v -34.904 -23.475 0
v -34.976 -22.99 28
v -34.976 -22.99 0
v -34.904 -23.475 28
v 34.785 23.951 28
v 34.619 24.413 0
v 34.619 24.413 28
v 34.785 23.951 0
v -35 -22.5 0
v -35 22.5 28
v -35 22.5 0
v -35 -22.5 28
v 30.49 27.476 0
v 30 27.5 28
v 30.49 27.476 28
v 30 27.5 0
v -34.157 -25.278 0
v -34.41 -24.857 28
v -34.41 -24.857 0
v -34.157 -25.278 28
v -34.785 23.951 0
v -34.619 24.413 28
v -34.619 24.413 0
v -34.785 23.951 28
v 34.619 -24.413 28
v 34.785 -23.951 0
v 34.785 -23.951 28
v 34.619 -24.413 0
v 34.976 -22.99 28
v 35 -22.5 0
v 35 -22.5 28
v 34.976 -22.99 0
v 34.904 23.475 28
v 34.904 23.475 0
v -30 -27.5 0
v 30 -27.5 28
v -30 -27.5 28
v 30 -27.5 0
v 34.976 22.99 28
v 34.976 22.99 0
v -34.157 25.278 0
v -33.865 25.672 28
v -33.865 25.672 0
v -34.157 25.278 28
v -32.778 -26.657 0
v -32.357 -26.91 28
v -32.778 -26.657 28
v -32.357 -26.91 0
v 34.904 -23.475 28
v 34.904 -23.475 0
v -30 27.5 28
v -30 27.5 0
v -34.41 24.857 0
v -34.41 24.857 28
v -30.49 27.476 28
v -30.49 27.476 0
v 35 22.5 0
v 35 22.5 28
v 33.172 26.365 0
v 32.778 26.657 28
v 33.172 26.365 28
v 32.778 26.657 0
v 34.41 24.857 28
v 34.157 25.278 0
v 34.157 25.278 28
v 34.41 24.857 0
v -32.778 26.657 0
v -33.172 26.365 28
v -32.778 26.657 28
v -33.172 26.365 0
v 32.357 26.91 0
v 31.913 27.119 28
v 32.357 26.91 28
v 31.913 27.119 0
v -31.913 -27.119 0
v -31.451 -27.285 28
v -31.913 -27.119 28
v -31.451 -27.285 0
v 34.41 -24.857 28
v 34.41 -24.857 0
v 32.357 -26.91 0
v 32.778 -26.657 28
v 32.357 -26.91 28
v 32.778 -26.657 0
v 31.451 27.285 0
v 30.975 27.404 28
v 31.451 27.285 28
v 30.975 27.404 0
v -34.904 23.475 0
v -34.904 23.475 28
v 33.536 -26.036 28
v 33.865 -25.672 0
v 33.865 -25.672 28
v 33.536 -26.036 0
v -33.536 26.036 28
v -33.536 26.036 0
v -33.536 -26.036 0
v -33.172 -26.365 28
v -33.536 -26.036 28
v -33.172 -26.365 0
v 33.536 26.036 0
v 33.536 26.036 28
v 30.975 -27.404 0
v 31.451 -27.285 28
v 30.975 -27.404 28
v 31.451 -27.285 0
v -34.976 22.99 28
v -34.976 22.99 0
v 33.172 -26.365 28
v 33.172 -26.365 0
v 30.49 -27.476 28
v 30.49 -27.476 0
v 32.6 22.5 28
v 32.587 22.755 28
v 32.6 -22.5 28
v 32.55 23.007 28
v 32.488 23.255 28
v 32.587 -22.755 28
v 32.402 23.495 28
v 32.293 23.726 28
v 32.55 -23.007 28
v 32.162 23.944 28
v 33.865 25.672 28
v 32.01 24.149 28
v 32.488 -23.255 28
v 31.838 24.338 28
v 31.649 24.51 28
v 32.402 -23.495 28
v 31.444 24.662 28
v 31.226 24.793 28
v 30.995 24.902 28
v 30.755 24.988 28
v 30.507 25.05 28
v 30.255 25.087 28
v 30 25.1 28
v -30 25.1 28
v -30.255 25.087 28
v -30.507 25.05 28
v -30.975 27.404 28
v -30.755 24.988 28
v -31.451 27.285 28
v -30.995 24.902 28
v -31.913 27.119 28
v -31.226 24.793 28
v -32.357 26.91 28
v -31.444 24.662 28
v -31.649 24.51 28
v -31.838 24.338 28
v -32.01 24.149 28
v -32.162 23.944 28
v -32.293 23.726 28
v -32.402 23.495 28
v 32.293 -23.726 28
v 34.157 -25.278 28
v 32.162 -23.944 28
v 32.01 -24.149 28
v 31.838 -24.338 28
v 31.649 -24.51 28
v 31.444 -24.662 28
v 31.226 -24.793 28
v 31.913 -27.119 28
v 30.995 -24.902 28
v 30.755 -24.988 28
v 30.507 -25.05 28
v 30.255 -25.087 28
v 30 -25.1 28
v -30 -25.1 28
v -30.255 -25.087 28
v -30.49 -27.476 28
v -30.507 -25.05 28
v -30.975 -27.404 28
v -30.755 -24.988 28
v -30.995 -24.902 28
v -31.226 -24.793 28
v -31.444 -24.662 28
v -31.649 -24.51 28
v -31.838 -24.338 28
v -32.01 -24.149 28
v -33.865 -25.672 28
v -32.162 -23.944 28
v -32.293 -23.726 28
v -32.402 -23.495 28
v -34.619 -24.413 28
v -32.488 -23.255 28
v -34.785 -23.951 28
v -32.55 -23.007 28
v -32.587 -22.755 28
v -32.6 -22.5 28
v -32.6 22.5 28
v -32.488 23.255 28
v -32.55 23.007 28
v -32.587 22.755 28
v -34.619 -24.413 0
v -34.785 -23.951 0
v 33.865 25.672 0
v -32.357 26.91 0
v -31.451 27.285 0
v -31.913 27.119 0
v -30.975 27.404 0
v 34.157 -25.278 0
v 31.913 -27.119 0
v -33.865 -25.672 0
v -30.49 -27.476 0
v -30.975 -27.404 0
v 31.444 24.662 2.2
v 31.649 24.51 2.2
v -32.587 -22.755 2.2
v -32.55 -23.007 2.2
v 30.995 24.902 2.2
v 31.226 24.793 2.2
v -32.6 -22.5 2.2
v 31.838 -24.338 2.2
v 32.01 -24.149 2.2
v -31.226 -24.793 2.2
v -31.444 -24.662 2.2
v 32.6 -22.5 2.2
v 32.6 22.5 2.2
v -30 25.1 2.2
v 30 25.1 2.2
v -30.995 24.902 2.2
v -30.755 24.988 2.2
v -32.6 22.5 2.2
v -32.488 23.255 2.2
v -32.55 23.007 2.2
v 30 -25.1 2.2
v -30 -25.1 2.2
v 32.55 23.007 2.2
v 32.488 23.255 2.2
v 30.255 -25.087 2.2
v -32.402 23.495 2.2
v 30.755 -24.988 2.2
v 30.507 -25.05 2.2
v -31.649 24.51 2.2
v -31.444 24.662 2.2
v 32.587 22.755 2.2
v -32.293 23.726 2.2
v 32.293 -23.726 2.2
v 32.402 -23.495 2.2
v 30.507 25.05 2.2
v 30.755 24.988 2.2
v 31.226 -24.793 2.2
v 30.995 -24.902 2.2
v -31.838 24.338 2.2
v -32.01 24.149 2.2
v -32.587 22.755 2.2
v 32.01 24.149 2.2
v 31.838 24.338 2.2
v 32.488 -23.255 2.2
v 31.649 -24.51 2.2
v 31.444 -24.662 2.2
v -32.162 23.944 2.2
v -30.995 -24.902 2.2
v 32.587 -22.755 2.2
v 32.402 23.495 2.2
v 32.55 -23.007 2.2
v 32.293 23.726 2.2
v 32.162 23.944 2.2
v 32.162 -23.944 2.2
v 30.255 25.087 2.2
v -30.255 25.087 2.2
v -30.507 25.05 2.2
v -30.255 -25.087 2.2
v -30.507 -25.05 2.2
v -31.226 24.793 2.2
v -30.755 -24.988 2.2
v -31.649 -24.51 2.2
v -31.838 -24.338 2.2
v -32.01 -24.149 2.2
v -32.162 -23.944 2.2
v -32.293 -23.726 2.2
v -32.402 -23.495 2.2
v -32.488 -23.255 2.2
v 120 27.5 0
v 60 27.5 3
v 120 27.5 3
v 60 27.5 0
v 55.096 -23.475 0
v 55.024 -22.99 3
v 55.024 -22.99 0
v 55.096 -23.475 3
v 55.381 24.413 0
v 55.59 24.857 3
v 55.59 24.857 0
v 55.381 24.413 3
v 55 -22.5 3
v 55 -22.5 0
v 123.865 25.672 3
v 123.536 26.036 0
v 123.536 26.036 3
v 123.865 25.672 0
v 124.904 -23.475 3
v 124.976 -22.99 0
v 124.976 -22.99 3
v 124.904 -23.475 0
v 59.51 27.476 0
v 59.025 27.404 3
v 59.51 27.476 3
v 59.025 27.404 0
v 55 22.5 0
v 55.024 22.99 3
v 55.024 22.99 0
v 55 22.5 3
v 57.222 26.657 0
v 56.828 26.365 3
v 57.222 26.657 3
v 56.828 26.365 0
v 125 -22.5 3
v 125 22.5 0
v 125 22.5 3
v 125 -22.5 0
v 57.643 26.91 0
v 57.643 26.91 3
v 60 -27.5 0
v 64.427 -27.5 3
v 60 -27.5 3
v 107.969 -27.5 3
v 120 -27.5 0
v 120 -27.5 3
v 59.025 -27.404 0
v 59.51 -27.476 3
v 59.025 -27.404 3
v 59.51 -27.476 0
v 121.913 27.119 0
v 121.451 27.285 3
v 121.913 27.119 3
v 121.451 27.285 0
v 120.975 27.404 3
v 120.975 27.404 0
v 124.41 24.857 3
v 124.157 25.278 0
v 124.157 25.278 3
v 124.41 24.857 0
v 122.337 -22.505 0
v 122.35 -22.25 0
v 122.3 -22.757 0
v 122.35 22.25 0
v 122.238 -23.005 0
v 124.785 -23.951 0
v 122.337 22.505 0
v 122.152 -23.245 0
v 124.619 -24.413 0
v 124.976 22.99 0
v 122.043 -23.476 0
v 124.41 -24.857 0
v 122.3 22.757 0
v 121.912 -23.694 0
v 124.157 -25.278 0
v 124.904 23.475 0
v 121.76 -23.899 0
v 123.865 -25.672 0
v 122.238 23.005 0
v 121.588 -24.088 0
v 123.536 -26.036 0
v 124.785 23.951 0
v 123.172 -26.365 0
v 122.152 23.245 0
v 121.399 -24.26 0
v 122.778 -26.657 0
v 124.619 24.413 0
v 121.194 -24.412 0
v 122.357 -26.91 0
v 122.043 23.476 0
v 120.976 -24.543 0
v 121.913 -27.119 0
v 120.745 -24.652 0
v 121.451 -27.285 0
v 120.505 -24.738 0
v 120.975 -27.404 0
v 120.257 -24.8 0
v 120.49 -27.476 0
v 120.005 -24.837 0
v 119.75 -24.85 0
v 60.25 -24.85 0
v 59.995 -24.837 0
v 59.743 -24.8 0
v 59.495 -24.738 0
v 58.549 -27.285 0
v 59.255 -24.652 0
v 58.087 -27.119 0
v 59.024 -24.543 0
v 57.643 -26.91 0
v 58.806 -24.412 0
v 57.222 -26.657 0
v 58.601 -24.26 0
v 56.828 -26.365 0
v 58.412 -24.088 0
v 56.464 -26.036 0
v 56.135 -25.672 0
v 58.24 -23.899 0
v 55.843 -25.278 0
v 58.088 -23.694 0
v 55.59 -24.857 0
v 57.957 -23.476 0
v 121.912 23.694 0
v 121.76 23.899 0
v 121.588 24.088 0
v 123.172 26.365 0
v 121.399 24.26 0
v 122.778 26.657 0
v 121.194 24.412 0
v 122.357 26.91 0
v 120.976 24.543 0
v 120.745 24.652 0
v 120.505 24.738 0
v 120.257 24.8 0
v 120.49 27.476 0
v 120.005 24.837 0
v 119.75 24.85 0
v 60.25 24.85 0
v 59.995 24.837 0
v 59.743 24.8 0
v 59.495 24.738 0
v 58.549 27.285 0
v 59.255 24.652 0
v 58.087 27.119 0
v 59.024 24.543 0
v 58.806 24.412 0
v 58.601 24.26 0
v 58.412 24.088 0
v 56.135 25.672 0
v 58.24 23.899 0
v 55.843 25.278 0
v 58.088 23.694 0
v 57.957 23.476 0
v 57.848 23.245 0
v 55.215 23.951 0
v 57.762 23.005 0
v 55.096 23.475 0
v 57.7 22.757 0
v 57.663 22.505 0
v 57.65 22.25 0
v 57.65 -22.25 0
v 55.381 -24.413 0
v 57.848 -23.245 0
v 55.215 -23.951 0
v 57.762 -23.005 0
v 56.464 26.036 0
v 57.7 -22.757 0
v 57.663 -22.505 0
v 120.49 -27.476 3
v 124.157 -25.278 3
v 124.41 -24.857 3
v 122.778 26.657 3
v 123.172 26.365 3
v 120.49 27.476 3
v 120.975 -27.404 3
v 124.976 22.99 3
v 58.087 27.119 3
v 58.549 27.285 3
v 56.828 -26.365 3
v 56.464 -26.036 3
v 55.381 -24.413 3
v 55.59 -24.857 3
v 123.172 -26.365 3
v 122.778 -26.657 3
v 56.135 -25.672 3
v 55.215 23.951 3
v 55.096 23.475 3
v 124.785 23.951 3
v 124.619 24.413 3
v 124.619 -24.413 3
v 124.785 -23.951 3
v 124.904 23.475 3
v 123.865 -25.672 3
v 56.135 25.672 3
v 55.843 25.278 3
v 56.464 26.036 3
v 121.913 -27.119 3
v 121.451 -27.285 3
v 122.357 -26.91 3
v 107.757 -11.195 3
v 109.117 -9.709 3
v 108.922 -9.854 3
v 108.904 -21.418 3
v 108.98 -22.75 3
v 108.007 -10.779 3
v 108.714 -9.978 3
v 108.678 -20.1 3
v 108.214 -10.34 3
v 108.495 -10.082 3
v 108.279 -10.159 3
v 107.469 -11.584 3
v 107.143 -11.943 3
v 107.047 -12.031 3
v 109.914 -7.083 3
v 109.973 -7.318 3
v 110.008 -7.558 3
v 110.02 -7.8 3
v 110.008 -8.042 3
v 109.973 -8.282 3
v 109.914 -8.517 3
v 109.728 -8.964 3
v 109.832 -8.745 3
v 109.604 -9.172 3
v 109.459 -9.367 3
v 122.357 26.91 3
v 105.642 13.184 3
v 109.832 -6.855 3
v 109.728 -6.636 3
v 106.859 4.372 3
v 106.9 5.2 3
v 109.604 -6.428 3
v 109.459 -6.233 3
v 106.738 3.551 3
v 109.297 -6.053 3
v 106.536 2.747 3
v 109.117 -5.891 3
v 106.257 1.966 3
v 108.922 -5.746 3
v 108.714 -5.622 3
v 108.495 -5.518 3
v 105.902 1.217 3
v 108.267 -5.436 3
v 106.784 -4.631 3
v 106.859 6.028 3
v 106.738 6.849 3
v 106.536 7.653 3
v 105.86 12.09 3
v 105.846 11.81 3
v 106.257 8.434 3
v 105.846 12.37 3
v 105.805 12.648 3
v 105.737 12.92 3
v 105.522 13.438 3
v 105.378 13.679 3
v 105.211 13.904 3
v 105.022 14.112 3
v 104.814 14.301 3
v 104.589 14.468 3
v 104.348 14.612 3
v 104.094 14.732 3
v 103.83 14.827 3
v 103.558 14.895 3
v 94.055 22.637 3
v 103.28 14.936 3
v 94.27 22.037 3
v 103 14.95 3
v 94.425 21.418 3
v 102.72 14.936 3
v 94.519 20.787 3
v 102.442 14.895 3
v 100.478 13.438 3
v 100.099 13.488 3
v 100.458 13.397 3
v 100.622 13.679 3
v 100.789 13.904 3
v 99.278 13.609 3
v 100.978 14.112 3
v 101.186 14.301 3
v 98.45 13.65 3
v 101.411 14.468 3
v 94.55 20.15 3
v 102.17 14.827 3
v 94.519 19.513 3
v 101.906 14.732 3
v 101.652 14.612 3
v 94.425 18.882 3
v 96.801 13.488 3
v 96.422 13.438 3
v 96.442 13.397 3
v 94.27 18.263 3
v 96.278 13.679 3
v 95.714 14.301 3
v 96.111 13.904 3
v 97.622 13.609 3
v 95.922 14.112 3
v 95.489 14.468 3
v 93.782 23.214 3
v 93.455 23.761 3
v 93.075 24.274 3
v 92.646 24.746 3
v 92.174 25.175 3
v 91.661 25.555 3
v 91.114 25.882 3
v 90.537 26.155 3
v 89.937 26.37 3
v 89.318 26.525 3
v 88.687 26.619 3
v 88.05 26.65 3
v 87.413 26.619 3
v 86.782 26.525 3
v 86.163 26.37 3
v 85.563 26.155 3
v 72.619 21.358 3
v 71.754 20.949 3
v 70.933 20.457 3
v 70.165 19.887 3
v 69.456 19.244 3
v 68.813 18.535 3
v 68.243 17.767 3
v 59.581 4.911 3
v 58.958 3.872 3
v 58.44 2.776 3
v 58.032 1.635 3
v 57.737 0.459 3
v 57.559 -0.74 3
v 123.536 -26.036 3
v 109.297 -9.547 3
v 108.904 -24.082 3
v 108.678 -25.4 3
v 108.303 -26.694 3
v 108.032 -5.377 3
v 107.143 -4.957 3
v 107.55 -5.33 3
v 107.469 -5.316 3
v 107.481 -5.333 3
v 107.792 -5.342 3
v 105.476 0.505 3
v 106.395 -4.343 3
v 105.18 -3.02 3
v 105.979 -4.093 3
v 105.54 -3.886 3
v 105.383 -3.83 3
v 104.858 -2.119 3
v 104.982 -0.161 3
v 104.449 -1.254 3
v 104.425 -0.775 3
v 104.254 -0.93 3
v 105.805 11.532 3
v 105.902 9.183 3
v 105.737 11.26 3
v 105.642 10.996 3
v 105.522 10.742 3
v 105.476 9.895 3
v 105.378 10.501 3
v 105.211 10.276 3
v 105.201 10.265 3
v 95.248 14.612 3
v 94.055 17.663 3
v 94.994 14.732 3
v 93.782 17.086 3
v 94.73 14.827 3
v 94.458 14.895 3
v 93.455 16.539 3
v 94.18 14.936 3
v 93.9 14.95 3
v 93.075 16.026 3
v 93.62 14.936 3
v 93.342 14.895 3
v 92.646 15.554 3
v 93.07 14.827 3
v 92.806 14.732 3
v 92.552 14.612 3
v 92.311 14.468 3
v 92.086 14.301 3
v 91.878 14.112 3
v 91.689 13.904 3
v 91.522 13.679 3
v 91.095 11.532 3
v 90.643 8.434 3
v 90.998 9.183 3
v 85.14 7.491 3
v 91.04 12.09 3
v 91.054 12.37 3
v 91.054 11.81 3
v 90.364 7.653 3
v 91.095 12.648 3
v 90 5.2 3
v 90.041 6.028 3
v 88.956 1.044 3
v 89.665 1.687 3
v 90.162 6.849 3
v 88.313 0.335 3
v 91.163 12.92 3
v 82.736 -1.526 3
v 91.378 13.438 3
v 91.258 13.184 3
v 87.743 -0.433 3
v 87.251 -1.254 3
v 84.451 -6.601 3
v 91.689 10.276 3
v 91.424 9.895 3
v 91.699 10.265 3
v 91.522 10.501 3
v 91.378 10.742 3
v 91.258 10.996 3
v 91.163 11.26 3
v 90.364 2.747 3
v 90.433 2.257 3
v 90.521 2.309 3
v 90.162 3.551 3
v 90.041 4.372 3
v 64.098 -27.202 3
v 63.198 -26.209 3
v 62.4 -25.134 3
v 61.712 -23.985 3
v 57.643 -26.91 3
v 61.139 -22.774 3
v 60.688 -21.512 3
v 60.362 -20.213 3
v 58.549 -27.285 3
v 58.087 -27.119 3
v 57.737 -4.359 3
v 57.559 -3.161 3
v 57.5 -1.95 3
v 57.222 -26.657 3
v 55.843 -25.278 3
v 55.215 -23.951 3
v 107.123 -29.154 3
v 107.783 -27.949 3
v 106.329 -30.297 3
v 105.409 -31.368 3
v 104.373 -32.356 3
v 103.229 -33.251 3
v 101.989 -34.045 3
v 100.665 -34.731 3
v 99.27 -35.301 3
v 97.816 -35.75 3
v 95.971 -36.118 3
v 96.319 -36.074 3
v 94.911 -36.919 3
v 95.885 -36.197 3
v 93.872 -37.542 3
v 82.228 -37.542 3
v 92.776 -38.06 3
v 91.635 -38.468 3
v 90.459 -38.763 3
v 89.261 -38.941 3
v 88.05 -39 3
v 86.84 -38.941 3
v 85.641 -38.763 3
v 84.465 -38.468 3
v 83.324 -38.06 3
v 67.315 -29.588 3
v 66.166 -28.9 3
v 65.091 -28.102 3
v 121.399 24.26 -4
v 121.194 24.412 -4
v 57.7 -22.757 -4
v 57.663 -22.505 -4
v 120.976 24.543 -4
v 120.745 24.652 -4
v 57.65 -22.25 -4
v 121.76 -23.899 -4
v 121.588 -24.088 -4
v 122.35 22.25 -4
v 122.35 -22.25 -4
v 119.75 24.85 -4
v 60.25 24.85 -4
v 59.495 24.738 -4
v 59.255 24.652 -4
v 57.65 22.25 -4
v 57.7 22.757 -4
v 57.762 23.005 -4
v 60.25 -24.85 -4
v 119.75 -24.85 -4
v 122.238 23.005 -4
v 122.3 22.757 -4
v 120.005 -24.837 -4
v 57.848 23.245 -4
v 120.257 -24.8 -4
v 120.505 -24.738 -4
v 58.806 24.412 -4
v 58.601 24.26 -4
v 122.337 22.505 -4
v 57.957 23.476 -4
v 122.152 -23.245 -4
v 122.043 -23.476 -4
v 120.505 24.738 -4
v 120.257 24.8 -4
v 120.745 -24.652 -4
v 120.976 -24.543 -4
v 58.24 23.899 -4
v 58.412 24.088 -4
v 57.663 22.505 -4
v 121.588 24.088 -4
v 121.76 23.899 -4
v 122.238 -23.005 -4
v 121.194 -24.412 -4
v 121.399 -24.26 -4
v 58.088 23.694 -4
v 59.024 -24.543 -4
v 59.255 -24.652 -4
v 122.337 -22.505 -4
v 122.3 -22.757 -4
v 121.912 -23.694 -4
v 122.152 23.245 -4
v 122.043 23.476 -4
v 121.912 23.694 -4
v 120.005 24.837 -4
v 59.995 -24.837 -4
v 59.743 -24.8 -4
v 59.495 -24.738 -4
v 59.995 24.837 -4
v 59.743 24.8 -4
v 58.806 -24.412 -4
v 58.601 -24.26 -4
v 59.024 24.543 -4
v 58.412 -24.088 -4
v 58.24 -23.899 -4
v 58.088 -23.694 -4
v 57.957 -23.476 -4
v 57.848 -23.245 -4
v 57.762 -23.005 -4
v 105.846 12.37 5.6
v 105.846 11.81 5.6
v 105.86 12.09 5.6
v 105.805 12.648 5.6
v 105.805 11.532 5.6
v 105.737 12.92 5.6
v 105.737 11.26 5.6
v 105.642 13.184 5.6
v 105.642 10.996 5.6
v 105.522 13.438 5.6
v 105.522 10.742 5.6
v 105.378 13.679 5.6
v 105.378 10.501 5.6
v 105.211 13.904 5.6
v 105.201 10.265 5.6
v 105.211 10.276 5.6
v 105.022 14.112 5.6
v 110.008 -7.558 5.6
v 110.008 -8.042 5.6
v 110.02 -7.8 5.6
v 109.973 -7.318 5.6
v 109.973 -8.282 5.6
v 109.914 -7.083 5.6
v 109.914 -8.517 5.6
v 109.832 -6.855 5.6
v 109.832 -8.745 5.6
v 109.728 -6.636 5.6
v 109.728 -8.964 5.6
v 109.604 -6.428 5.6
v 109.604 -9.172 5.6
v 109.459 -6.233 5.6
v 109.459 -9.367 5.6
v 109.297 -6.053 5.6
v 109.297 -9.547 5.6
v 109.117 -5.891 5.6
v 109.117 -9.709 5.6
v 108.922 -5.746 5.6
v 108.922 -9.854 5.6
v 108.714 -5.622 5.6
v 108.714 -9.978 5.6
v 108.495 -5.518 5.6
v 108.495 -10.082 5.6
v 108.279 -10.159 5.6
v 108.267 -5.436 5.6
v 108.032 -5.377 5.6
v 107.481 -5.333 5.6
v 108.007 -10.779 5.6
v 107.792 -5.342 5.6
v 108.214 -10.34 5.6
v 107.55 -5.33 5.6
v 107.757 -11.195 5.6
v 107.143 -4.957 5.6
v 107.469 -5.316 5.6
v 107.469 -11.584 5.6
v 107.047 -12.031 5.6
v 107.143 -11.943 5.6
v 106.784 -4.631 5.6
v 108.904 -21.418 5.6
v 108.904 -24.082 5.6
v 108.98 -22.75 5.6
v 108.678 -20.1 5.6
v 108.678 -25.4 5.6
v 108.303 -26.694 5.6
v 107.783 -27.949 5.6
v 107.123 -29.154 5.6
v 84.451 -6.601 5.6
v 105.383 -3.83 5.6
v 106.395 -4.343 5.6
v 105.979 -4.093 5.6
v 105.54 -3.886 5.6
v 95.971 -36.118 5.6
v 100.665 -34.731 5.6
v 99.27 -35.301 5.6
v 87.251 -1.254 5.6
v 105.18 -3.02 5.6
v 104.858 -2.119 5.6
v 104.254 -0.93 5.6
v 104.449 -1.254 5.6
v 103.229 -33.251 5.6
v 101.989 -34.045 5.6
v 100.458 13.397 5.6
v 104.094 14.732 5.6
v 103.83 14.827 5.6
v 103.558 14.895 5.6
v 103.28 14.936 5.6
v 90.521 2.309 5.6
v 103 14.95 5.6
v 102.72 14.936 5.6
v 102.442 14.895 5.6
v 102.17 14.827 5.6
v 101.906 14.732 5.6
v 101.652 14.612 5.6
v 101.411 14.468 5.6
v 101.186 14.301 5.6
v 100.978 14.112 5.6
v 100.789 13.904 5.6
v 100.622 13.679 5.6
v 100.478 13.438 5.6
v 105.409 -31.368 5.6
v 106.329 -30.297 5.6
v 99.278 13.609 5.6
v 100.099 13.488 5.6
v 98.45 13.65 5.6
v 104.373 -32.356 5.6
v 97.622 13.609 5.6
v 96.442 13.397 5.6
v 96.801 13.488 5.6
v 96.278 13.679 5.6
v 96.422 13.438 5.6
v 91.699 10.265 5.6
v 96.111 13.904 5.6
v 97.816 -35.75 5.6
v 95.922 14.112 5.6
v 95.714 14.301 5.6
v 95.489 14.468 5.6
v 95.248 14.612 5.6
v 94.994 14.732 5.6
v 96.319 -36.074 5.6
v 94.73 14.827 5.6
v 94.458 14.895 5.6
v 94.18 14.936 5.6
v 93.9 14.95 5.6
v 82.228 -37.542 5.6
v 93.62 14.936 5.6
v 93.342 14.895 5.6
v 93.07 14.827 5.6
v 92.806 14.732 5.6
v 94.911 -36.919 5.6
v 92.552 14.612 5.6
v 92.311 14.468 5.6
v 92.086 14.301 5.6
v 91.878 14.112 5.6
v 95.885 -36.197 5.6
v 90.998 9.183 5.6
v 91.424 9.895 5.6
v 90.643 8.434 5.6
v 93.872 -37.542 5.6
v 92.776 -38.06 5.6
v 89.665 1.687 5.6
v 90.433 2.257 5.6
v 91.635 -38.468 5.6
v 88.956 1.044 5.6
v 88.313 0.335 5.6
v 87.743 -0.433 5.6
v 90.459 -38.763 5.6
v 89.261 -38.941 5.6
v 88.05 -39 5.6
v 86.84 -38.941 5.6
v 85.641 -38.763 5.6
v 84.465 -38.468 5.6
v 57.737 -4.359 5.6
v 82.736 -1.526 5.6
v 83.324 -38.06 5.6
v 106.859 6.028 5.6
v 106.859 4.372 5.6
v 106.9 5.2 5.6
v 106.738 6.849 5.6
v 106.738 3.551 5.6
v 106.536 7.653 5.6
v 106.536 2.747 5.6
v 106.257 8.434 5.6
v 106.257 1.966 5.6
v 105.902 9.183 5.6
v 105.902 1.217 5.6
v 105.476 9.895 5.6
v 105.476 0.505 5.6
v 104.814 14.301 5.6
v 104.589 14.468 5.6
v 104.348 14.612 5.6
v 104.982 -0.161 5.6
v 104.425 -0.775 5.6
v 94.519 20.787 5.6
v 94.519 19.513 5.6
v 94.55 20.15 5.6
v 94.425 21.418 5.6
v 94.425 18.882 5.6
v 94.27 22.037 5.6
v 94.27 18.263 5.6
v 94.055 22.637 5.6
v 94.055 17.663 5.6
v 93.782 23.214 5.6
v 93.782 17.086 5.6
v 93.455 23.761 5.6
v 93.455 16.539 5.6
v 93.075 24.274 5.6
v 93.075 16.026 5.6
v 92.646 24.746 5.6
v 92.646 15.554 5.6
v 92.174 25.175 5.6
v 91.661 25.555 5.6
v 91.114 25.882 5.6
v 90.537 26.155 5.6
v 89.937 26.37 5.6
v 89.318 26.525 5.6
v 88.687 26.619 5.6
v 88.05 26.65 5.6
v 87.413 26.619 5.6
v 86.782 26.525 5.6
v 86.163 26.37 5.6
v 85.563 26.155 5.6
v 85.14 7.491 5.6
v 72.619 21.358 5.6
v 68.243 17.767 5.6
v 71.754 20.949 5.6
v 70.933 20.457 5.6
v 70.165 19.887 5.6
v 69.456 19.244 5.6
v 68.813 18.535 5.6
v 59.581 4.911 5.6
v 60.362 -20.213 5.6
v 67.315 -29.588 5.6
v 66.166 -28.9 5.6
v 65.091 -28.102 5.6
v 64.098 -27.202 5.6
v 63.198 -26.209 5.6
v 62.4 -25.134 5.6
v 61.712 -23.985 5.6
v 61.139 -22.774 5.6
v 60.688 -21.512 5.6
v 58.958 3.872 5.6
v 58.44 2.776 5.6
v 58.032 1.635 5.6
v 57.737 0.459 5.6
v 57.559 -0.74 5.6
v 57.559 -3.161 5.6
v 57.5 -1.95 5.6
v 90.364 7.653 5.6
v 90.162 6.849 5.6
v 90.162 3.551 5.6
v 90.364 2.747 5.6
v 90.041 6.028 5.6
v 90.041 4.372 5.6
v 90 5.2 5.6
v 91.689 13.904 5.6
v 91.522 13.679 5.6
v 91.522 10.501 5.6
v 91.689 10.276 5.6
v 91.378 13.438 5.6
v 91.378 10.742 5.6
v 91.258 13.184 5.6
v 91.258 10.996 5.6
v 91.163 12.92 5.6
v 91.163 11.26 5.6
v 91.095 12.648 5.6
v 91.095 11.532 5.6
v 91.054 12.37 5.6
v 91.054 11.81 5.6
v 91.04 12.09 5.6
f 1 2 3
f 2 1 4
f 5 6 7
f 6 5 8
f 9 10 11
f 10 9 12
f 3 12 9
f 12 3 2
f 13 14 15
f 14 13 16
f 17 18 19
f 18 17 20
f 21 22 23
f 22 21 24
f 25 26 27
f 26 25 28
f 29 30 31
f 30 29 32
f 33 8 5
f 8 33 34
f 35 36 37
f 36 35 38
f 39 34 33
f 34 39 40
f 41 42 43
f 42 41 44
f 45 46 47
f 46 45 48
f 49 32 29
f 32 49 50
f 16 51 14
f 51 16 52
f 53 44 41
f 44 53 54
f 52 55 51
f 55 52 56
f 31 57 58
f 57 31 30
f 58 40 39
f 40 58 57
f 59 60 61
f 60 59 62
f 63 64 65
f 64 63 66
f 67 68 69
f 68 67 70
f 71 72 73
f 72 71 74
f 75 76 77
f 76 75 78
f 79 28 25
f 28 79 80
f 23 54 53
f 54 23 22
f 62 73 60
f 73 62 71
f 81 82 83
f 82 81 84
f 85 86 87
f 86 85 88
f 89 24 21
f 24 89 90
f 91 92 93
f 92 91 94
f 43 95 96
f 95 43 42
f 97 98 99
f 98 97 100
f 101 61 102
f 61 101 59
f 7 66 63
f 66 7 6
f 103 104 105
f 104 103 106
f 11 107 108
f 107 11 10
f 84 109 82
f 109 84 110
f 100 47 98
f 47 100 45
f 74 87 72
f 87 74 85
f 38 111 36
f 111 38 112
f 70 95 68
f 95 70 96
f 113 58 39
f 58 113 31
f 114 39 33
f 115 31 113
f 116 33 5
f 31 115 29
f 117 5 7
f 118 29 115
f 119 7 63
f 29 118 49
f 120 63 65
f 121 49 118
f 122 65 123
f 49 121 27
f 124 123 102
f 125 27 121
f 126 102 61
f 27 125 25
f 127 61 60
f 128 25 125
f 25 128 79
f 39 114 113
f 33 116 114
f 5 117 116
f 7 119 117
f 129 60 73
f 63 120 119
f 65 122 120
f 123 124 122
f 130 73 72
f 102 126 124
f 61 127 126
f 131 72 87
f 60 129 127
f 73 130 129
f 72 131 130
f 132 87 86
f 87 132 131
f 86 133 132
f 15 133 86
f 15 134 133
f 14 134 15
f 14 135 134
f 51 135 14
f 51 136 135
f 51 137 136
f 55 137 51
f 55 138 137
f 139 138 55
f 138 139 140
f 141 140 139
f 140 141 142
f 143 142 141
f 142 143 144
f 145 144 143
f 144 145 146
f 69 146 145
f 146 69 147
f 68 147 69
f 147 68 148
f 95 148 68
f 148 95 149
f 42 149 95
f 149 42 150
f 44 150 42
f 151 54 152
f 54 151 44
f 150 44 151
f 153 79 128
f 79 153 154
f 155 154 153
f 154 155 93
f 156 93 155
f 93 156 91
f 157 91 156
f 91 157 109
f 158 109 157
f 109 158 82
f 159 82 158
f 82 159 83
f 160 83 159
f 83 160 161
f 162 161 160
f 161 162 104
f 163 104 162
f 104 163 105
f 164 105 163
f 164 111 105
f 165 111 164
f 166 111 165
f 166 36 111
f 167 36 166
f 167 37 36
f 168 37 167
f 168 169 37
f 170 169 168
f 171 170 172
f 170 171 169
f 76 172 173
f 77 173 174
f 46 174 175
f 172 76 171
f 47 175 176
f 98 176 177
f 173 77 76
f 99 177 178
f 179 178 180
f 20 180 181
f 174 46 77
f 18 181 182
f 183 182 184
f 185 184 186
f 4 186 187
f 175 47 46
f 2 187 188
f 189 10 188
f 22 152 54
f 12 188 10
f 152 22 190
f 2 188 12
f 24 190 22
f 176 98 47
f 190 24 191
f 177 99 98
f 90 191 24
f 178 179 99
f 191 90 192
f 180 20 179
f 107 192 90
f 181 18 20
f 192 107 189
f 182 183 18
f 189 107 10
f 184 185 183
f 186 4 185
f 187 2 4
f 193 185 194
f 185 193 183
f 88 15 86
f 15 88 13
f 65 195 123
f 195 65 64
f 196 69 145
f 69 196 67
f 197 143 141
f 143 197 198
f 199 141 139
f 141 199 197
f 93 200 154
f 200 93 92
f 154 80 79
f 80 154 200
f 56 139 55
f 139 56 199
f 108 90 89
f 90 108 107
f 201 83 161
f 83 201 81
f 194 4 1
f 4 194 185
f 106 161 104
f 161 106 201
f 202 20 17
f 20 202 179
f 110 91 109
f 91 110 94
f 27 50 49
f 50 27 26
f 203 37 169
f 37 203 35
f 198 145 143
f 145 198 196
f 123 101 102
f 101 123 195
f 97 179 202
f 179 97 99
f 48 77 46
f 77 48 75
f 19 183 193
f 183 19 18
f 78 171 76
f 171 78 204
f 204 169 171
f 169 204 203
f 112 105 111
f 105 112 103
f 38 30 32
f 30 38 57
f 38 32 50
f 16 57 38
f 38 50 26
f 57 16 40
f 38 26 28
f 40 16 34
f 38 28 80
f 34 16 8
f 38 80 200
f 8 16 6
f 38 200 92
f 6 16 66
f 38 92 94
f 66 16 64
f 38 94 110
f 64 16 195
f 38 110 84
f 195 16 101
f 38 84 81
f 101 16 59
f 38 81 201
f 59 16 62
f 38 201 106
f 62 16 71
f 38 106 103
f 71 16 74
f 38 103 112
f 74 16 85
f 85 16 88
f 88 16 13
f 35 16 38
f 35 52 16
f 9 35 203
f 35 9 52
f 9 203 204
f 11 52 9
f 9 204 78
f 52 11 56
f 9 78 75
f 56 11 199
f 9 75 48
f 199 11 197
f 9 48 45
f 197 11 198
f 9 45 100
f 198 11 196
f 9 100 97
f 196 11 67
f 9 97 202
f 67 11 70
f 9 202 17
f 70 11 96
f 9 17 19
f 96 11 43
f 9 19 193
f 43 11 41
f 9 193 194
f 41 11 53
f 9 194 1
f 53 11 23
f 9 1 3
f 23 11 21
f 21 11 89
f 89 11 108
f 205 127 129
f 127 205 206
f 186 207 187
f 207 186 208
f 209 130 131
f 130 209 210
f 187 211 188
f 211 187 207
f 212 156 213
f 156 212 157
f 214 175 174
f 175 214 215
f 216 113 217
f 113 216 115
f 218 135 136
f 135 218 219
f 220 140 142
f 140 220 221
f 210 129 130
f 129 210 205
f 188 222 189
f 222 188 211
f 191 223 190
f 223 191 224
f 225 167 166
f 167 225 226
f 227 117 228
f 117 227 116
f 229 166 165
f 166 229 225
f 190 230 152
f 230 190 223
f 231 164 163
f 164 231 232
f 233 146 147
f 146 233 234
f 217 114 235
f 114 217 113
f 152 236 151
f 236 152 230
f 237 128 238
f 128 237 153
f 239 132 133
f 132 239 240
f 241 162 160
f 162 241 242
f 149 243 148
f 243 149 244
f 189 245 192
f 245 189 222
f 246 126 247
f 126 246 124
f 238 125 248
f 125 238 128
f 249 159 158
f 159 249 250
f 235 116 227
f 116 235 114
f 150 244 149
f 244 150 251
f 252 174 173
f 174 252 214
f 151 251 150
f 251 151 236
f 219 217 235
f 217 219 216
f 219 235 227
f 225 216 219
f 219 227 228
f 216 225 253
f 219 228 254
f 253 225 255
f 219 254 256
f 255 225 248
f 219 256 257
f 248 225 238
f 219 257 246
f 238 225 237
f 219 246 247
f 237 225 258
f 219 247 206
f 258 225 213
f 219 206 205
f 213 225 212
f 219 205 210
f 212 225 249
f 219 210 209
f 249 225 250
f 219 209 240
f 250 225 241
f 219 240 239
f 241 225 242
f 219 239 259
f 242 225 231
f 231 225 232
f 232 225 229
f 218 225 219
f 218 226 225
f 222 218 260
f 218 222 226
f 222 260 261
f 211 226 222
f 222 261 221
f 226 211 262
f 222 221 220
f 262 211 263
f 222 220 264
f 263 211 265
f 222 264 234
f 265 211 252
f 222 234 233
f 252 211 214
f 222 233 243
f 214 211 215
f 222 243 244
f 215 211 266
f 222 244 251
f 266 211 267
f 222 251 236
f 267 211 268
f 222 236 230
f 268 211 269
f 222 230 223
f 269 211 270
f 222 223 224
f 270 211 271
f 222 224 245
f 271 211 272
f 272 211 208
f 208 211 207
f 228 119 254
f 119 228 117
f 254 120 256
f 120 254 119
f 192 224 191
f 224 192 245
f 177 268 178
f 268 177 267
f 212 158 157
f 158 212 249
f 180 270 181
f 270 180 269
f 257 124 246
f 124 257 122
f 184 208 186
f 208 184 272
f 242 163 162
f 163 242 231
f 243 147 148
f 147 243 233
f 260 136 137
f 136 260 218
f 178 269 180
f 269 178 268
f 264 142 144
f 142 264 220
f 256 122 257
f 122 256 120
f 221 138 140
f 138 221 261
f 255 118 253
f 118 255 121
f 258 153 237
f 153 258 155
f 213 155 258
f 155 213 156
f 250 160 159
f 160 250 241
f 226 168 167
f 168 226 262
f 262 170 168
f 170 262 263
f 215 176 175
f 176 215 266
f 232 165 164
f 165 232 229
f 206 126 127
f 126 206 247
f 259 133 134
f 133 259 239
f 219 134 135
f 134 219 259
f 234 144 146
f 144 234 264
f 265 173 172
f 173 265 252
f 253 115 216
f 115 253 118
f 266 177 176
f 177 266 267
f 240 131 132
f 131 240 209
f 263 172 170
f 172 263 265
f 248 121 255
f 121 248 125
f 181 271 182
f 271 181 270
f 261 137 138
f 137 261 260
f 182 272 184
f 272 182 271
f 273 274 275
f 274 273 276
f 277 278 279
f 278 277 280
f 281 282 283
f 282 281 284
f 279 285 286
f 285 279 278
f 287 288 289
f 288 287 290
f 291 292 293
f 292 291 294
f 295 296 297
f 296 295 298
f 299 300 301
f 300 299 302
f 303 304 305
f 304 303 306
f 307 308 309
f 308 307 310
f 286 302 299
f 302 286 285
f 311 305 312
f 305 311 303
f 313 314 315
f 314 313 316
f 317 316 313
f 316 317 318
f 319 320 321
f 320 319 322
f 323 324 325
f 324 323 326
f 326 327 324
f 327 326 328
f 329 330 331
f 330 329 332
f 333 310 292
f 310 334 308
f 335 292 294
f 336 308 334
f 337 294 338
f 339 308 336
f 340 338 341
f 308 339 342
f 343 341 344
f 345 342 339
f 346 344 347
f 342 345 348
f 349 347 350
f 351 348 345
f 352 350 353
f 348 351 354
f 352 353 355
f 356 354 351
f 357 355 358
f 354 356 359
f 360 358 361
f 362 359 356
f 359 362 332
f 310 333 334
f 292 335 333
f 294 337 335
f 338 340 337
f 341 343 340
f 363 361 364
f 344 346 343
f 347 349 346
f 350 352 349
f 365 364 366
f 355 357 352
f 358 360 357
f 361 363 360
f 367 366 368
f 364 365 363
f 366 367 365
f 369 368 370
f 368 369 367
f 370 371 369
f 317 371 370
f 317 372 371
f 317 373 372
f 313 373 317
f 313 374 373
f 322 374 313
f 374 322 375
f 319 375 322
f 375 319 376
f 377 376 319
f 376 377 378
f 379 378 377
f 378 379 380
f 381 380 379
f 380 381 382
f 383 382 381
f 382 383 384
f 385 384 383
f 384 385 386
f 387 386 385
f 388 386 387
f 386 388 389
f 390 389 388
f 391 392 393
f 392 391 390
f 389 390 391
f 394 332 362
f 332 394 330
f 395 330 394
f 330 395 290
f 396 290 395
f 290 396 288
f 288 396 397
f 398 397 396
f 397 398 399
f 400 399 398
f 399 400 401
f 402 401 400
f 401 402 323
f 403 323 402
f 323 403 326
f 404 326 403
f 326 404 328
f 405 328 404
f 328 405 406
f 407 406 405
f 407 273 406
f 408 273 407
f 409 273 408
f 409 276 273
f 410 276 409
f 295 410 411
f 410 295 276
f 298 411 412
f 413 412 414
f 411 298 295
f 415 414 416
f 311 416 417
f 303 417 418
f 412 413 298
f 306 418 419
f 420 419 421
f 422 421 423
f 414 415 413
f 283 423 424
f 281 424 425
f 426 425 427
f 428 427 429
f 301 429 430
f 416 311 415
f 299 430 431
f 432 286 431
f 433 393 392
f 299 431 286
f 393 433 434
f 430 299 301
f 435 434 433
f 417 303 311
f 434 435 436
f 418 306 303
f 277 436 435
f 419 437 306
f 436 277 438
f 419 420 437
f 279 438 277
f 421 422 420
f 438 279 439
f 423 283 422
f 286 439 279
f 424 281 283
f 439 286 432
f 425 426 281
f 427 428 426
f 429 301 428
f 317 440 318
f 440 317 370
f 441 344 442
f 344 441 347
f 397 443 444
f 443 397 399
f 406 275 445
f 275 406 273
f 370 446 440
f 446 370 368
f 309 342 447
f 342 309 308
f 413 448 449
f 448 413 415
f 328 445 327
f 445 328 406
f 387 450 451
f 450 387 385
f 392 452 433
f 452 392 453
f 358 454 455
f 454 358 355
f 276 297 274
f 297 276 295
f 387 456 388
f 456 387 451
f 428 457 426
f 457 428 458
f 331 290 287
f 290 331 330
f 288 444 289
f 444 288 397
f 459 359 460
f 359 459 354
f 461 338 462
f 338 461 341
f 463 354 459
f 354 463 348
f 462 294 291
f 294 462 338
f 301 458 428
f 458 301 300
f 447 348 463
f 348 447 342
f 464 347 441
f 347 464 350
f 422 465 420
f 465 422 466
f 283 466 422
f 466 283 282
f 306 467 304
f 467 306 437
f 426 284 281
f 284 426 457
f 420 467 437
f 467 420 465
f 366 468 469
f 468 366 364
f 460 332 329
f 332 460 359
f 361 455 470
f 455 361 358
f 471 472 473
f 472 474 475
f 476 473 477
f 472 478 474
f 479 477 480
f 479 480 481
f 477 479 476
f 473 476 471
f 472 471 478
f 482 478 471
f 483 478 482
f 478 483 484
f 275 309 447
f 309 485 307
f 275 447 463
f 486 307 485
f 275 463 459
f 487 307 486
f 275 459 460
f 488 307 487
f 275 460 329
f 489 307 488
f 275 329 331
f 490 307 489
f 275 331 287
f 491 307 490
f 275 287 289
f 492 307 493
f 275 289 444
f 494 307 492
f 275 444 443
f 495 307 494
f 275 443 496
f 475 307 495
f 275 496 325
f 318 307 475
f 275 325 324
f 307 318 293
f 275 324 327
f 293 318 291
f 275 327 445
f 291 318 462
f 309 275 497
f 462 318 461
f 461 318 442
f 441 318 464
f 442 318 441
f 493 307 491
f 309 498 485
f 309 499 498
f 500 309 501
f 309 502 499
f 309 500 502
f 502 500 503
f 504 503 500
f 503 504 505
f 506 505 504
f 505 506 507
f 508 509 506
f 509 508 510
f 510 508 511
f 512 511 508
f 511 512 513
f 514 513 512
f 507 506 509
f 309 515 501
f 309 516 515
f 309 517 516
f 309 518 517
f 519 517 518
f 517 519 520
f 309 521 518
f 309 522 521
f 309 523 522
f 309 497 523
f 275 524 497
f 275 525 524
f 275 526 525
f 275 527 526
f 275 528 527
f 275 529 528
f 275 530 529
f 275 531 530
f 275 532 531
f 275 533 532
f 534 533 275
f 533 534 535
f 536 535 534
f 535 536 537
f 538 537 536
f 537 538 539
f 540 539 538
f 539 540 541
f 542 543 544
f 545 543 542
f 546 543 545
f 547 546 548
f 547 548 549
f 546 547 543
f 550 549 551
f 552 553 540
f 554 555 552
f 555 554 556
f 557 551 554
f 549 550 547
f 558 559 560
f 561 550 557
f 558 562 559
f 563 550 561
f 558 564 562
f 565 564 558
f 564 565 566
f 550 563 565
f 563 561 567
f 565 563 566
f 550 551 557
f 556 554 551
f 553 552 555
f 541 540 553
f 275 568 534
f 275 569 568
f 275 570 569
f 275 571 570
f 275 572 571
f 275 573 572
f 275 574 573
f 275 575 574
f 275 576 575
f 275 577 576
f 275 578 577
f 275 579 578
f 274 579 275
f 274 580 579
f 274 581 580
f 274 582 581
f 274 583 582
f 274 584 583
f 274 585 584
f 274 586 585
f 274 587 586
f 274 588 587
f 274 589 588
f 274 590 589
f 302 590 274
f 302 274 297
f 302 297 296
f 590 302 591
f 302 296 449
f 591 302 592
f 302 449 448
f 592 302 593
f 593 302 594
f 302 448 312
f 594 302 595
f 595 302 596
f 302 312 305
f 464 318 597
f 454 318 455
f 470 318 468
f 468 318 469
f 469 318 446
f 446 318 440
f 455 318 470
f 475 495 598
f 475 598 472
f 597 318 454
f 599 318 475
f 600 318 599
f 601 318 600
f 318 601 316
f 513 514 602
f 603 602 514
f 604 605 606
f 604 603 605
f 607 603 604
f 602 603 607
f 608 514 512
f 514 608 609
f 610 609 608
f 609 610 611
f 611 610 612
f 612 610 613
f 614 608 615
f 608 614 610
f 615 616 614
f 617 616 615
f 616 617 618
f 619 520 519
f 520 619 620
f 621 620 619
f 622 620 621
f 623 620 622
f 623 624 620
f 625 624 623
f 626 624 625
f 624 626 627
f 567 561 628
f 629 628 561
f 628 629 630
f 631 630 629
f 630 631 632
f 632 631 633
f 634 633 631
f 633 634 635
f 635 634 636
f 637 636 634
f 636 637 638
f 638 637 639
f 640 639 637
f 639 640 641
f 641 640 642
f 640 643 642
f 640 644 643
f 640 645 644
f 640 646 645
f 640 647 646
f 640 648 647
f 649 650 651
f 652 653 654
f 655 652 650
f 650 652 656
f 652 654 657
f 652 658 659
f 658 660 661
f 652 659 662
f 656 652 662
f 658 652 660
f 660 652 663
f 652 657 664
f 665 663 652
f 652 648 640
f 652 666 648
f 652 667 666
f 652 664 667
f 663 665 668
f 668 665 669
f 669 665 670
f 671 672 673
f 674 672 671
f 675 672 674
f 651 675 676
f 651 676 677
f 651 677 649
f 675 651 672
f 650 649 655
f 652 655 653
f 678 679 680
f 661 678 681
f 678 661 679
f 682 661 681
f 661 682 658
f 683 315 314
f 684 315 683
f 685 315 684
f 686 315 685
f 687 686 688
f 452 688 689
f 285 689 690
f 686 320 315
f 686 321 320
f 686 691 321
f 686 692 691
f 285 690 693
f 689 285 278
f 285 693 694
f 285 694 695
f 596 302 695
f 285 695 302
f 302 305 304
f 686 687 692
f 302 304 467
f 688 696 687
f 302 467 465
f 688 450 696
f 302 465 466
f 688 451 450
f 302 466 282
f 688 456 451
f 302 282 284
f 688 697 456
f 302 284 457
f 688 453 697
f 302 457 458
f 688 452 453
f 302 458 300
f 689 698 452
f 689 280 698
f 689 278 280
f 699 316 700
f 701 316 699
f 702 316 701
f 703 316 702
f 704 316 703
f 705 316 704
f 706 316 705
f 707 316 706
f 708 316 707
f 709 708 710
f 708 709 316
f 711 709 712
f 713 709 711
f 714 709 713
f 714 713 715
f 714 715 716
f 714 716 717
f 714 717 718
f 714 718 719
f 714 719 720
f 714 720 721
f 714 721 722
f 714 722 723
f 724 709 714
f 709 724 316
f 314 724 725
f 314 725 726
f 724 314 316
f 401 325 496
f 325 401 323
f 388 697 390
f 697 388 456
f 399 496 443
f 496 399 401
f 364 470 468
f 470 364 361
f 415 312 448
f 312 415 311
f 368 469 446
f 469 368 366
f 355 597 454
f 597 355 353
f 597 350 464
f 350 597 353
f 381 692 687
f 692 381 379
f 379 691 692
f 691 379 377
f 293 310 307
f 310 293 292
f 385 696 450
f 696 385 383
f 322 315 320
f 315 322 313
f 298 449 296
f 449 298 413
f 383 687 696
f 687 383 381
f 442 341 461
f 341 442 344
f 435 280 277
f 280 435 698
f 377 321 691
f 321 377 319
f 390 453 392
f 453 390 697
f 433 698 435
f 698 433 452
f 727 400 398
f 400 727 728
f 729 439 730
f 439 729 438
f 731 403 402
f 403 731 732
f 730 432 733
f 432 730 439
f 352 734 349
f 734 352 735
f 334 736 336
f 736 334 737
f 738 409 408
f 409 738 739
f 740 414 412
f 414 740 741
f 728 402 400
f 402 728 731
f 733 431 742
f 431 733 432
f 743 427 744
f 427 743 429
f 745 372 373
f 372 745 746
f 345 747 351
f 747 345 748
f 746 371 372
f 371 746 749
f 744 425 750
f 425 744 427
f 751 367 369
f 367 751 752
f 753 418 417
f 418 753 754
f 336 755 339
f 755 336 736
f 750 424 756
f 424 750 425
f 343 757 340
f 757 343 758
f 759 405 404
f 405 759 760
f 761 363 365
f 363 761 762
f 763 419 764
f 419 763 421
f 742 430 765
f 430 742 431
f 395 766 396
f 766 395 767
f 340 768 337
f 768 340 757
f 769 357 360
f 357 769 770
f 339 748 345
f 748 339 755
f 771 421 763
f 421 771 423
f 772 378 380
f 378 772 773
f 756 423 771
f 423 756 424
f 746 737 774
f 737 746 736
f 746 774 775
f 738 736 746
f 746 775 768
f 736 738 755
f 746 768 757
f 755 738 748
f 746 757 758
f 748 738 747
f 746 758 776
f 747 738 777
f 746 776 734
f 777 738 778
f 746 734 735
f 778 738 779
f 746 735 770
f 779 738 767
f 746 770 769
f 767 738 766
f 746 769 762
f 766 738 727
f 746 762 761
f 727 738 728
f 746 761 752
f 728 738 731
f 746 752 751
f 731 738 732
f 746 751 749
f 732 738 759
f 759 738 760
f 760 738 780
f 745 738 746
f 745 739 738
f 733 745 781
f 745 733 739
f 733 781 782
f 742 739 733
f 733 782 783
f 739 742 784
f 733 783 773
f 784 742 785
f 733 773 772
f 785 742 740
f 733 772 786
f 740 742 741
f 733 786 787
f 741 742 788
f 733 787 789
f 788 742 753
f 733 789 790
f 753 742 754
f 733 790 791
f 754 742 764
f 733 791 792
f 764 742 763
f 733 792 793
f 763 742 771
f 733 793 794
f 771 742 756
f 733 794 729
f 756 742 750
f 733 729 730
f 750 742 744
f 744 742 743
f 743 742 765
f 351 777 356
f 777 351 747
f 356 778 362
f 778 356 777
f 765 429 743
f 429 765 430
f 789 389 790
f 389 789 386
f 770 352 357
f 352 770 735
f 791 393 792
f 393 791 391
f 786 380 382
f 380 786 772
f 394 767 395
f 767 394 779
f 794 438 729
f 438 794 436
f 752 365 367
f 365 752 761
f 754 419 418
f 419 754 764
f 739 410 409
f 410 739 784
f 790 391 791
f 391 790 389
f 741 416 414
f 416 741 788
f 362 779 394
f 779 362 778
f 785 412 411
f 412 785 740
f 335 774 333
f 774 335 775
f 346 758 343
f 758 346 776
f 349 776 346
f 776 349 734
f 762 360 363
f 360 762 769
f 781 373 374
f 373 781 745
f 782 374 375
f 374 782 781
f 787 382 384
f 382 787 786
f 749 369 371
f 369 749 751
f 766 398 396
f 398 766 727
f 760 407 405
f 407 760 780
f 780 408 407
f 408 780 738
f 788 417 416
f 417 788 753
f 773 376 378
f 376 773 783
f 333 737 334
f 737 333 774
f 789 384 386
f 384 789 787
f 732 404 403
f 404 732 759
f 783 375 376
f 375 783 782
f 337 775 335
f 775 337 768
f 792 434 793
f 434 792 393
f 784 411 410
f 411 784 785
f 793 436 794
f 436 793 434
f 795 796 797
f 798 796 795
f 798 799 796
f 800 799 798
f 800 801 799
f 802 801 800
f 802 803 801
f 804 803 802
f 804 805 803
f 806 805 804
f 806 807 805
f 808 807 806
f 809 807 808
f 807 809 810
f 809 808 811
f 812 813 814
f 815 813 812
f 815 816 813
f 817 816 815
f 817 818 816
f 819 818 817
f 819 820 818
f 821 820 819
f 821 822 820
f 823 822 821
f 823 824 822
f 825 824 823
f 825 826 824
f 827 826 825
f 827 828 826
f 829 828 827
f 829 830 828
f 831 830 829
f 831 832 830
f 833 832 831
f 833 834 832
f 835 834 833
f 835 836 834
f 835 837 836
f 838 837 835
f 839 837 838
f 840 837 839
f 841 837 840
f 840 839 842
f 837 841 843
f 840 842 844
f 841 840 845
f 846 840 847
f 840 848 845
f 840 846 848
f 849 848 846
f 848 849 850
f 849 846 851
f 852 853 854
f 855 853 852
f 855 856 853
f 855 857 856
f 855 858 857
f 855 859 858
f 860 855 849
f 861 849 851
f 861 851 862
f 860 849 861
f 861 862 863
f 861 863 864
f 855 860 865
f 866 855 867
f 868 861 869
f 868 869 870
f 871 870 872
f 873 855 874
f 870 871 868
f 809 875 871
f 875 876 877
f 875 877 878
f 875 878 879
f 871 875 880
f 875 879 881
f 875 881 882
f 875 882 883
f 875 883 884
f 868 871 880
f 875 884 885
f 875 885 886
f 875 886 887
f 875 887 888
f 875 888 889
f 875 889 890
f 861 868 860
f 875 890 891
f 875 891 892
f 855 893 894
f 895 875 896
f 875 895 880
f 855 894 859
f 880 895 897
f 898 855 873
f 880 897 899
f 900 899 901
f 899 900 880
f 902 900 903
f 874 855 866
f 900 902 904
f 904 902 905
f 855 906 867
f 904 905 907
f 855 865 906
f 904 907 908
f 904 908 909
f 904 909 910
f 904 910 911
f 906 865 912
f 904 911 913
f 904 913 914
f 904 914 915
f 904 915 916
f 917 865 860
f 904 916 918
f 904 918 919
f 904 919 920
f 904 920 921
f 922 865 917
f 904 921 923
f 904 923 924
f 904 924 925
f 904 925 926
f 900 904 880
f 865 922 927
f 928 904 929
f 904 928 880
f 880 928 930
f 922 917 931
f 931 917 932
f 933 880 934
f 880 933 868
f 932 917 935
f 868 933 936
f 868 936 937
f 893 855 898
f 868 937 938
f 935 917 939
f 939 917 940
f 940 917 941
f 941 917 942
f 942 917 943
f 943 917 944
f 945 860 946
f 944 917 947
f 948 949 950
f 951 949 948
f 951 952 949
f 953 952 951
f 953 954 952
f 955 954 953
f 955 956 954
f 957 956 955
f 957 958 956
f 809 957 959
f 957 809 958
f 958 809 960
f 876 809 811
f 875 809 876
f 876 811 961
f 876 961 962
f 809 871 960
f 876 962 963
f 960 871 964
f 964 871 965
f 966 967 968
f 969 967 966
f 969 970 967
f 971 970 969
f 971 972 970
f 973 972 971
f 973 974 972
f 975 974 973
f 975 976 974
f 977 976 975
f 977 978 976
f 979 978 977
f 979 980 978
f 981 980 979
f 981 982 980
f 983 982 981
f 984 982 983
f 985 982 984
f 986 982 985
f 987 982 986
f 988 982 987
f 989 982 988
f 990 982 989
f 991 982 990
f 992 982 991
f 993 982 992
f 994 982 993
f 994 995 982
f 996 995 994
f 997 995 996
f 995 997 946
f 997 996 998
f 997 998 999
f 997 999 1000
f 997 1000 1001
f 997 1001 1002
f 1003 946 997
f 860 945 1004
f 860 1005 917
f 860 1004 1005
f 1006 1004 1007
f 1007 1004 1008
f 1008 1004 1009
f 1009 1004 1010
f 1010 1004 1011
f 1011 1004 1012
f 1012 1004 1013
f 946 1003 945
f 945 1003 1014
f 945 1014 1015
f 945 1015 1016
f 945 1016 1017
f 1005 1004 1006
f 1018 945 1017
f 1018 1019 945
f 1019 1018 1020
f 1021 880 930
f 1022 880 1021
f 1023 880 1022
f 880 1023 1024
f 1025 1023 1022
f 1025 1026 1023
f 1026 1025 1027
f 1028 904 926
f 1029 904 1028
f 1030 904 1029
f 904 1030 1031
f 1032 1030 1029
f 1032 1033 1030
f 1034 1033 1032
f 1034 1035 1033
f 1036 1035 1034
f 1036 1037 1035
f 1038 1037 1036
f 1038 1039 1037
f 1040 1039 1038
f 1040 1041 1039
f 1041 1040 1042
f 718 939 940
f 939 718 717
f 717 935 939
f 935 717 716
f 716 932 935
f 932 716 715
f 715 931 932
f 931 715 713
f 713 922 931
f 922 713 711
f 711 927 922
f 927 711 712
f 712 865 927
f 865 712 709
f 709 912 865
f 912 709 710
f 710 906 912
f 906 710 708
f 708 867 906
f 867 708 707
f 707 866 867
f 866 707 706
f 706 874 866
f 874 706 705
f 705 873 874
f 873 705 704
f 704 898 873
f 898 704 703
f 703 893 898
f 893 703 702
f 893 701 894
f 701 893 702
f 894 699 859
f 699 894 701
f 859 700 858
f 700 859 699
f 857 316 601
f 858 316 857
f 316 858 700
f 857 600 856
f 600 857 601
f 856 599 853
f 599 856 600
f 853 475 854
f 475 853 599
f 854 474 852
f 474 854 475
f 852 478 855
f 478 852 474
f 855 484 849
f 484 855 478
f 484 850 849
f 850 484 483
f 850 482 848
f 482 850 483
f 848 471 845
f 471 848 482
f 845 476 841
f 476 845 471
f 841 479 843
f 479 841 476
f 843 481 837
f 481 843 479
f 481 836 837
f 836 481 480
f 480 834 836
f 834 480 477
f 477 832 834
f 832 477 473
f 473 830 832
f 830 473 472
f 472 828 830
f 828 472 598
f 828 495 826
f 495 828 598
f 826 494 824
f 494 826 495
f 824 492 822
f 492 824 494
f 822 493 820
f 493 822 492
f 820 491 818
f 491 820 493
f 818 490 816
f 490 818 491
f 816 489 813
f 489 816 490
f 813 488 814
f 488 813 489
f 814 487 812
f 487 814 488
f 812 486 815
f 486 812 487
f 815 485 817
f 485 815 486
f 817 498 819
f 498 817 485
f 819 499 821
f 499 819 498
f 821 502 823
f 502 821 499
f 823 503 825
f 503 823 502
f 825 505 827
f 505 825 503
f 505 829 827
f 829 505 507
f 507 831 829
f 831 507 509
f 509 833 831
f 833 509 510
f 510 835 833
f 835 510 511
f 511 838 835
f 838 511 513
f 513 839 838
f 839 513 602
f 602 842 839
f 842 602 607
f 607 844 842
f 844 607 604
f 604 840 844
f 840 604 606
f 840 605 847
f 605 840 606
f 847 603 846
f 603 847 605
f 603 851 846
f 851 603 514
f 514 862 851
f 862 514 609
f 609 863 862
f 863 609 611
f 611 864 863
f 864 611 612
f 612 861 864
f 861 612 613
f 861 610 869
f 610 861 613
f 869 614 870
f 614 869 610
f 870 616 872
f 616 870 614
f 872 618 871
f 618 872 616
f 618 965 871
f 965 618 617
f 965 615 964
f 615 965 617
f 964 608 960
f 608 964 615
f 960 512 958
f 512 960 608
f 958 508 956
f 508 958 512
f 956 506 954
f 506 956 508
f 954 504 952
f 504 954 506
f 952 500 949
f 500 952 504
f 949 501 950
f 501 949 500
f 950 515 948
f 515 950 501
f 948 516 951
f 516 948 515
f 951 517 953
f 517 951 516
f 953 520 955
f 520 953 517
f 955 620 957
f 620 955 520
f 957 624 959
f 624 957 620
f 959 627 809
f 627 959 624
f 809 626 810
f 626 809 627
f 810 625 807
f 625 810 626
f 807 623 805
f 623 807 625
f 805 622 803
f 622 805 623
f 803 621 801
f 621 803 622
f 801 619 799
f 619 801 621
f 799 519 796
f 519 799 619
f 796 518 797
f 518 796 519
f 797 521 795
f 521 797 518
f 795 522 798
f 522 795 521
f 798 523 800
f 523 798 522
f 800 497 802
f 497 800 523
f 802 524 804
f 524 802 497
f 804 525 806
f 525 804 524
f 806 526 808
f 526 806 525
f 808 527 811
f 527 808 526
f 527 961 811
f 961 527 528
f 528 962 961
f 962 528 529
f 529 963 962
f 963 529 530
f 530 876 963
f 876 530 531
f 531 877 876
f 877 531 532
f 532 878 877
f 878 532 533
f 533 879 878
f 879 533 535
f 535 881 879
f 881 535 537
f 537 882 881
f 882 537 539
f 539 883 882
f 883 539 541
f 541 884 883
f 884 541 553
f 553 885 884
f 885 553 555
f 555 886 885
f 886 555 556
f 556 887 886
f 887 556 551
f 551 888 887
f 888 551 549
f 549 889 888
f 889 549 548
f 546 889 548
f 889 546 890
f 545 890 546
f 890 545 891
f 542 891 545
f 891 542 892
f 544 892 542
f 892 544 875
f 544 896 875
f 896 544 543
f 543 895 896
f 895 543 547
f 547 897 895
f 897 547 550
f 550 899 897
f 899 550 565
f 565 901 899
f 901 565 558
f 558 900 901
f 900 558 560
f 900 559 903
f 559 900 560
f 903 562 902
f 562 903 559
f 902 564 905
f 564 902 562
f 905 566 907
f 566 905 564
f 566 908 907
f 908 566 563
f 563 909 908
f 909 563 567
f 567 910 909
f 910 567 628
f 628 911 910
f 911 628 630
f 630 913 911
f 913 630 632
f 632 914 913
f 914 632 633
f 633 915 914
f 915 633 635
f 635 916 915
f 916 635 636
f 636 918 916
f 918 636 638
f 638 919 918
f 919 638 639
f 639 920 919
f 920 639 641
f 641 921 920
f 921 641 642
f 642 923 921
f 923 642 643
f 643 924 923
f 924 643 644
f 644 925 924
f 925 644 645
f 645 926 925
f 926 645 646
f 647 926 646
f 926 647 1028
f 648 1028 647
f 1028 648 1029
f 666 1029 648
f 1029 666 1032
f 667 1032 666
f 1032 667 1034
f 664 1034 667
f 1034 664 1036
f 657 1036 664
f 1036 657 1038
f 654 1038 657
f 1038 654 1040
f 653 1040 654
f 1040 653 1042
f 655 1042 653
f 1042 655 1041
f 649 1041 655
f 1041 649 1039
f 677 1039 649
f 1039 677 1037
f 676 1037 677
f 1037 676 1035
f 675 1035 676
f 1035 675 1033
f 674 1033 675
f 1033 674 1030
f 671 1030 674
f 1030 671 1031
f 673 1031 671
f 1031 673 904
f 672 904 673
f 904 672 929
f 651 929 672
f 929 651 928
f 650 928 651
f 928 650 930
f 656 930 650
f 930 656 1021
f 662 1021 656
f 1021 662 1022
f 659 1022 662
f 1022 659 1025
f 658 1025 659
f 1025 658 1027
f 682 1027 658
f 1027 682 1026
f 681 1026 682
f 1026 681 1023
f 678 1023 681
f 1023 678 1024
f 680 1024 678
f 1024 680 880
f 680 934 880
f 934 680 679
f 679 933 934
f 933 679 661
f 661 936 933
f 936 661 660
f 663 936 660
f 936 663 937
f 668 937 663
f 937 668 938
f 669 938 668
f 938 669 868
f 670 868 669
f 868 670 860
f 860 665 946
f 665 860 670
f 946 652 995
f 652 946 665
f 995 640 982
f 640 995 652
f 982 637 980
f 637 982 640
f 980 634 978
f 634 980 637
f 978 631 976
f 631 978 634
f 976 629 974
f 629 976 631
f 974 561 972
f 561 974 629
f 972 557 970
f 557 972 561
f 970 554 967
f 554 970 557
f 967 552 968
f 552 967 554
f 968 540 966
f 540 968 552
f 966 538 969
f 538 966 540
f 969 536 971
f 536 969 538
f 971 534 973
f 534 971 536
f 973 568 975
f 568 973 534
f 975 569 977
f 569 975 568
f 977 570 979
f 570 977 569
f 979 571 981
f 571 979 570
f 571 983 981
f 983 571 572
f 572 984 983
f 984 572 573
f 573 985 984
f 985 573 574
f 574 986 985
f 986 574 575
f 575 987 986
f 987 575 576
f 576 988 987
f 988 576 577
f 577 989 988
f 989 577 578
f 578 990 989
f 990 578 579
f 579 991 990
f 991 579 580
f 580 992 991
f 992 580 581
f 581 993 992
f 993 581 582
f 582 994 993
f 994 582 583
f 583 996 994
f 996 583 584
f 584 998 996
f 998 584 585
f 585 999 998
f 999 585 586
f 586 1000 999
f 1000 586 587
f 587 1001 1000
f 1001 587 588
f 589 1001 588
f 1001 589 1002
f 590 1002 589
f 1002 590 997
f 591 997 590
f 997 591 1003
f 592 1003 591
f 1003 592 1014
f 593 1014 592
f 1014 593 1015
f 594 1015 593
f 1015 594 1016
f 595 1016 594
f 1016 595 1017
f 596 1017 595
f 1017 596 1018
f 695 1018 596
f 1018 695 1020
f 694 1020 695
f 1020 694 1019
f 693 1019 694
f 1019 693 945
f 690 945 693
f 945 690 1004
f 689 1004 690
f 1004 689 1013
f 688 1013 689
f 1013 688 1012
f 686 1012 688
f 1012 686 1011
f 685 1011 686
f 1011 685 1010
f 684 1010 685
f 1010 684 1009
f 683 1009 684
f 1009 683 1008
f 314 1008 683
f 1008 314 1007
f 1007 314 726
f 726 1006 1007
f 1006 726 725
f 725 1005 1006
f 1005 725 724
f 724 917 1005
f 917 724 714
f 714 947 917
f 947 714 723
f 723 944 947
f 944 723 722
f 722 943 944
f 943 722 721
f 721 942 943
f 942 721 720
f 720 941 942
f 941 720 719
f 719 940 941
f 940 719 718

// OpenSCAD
// Squirrel Relief Box
// A small lidded box with a stylized, raised squirrel silhouette on the lid.
// Artistic interpretation of a red squirrel spotted mid-bite in a burnt pine,
// reduced to a sitting-with-curled-tail pictogram built from unioned primitives
// (deliberately geometric/CSG-native rather than a traced photo outline).

$fn = 64;

// ---- Parameters ----
BOX_W   = 70;   // outer box width (x)
BOX_D   = 55;   // outer box depth (y)
BOX_H   = 28;   // outer box height, walls only (not counting lid)
WALL_T  = 2.4;  // wall thickness
FLOOR_T = 2.2;  // floor thickness
CORNER_R = 5;   // outer corner rounding radius

LID_T      = 3.0;  // lid slab thickness
LID_LIP_H  = 4.0;  // depth of the lip that plugs into the box cavity
LID_CLEARANCE = 0.25; // fit clearance, print-friendly

RELIEF_H  = 2.6;   // how far the squirrel stands proud of the lid surface
RELIEF_SCALE = 1.3; // overall scale of the silhouette on the lid
// approximate centroid of squirrel_silhouette() in its own local coordinates,
// used below to center the (scaled) relief on the lid
RELIEF_CENTROID = [-2.5, 9.5];

// ---- Helper: rounded rectangle ----
module rounded_rect(w, d, r) {
    hull() {
        for (sx = [-1, 1], sy = [-1, 1])
            translate([sx*(w/2 - r), sy*(d/2 - r)])
                circle(r = r);
    }
}

// ---- Squirrel silhouette, built as a union of primitives ----
// Local coordinate origin sits roughly at the squirrel's haunches.
// Tail is a chain of hulled circles along a curling arc -- thick where it
// leaves the body, tapering as it sweeps up and over the back -- which
// keeps it fused to the body silhouette rather than reading as a separate
// crescent/moon shape.
module squirrel_silhouette() {
    tail_pts = [
        [-4, -11, 9.5],
        [-15, -4, 10.5],
        [-18, 8,  9.5],
        [-13, 19, 7.5],
        [-4, 25,  5.0],
    ];

    module tail() {
        for (i = [0 : len(tail_pts) - 2]) {
            hull() {
                translate([tail_pts[i][0], tail_pts[i][1]]) circle(r = tail_pts[i][2]);
                translate([tail_pts[i+1][0], tail_pts[i+1][1]]) circle(r = tail_pts[i+1][2]);
            }
        }
    }

    union() {
        tail();
        // body: haunches (wide/low) blending to shoulders (narrower/higher)
        hull() {
            translate([0, -8]) scale([1.1, 0.95]) circle(r = 11);
            translate([2, 5])  circle(r = 7.5);
        }
        // chest bump / paws
        translate([8, 3]) circle(r = 3.8);
        // head
        translate([4, 13.5]) circle(r = 6.5);
        // ears
        translate([0.5, 18.8]) circle(r = 2.2);
        translate([7.5, 18.8]) circle(r = 2.2);
        // acorn at the mouth
        translate([11, 3.5]) circle(r = 1.9);
    }
}

// ---- Box body ----
module box_body() {
    difference() {
        // outer shell
        linear_extrude(height = BOX_H)
            rounded_rect(BOX_W, BOX_D, CORNER_R);
        // hollow cavity
        translate([0, 0, FLOOR_T])
            linear_extrude(height = BOX_H) // taller than needed, fine since it's a difference
                rounded_rect(BOX_W - 2*WALL_T, BOX_D - 2*WALL_T, max(CORNER_R - WALL_T, 1));
    }
}

// ---- Lid ----
module lid() {
    inner_w = BOX_W - 2*WALL_T - 2*LID_CLEARANCE;
    inner_d = BOX_D - 2*WALL_T - 2*LID_CLEARANCE;

    union() {
        // top slab, sized to the full outer footprint (overhangs the walls slightly like a proper lid)
        linear_extrude(height = LID_T)
            rounded_rect(BOX_W, BOX_D, CORNER_R);

        // plug/lip on the underside that registers into the box cavity
        translate([0, 0, -LID_LIP_H])
            linear_extrude(height = LID_LIP_H)
                rounded_rect(inner_w, inner_d, max(CORNER_R - WALL_T, 1));

        // raised squirrel relief on top of the lid, centered
        translate([-RELIEF_CENTROID[0]*RELIEF_SCALE, -RELIEF_CENTROID[1]*RELIEF_SCALE, LID_T])
            linear_extrude(height = RELIEF_H, scale = 1.0)
                scale(RELIEF_SCALE)
                    squirrel_silhouette();
    }
}

// ---- Layout: box on the left, lid (relief-up) on the right, both print-ready ----
box_body();
translate([BOX_W + 20, 0, 0]) lid();
